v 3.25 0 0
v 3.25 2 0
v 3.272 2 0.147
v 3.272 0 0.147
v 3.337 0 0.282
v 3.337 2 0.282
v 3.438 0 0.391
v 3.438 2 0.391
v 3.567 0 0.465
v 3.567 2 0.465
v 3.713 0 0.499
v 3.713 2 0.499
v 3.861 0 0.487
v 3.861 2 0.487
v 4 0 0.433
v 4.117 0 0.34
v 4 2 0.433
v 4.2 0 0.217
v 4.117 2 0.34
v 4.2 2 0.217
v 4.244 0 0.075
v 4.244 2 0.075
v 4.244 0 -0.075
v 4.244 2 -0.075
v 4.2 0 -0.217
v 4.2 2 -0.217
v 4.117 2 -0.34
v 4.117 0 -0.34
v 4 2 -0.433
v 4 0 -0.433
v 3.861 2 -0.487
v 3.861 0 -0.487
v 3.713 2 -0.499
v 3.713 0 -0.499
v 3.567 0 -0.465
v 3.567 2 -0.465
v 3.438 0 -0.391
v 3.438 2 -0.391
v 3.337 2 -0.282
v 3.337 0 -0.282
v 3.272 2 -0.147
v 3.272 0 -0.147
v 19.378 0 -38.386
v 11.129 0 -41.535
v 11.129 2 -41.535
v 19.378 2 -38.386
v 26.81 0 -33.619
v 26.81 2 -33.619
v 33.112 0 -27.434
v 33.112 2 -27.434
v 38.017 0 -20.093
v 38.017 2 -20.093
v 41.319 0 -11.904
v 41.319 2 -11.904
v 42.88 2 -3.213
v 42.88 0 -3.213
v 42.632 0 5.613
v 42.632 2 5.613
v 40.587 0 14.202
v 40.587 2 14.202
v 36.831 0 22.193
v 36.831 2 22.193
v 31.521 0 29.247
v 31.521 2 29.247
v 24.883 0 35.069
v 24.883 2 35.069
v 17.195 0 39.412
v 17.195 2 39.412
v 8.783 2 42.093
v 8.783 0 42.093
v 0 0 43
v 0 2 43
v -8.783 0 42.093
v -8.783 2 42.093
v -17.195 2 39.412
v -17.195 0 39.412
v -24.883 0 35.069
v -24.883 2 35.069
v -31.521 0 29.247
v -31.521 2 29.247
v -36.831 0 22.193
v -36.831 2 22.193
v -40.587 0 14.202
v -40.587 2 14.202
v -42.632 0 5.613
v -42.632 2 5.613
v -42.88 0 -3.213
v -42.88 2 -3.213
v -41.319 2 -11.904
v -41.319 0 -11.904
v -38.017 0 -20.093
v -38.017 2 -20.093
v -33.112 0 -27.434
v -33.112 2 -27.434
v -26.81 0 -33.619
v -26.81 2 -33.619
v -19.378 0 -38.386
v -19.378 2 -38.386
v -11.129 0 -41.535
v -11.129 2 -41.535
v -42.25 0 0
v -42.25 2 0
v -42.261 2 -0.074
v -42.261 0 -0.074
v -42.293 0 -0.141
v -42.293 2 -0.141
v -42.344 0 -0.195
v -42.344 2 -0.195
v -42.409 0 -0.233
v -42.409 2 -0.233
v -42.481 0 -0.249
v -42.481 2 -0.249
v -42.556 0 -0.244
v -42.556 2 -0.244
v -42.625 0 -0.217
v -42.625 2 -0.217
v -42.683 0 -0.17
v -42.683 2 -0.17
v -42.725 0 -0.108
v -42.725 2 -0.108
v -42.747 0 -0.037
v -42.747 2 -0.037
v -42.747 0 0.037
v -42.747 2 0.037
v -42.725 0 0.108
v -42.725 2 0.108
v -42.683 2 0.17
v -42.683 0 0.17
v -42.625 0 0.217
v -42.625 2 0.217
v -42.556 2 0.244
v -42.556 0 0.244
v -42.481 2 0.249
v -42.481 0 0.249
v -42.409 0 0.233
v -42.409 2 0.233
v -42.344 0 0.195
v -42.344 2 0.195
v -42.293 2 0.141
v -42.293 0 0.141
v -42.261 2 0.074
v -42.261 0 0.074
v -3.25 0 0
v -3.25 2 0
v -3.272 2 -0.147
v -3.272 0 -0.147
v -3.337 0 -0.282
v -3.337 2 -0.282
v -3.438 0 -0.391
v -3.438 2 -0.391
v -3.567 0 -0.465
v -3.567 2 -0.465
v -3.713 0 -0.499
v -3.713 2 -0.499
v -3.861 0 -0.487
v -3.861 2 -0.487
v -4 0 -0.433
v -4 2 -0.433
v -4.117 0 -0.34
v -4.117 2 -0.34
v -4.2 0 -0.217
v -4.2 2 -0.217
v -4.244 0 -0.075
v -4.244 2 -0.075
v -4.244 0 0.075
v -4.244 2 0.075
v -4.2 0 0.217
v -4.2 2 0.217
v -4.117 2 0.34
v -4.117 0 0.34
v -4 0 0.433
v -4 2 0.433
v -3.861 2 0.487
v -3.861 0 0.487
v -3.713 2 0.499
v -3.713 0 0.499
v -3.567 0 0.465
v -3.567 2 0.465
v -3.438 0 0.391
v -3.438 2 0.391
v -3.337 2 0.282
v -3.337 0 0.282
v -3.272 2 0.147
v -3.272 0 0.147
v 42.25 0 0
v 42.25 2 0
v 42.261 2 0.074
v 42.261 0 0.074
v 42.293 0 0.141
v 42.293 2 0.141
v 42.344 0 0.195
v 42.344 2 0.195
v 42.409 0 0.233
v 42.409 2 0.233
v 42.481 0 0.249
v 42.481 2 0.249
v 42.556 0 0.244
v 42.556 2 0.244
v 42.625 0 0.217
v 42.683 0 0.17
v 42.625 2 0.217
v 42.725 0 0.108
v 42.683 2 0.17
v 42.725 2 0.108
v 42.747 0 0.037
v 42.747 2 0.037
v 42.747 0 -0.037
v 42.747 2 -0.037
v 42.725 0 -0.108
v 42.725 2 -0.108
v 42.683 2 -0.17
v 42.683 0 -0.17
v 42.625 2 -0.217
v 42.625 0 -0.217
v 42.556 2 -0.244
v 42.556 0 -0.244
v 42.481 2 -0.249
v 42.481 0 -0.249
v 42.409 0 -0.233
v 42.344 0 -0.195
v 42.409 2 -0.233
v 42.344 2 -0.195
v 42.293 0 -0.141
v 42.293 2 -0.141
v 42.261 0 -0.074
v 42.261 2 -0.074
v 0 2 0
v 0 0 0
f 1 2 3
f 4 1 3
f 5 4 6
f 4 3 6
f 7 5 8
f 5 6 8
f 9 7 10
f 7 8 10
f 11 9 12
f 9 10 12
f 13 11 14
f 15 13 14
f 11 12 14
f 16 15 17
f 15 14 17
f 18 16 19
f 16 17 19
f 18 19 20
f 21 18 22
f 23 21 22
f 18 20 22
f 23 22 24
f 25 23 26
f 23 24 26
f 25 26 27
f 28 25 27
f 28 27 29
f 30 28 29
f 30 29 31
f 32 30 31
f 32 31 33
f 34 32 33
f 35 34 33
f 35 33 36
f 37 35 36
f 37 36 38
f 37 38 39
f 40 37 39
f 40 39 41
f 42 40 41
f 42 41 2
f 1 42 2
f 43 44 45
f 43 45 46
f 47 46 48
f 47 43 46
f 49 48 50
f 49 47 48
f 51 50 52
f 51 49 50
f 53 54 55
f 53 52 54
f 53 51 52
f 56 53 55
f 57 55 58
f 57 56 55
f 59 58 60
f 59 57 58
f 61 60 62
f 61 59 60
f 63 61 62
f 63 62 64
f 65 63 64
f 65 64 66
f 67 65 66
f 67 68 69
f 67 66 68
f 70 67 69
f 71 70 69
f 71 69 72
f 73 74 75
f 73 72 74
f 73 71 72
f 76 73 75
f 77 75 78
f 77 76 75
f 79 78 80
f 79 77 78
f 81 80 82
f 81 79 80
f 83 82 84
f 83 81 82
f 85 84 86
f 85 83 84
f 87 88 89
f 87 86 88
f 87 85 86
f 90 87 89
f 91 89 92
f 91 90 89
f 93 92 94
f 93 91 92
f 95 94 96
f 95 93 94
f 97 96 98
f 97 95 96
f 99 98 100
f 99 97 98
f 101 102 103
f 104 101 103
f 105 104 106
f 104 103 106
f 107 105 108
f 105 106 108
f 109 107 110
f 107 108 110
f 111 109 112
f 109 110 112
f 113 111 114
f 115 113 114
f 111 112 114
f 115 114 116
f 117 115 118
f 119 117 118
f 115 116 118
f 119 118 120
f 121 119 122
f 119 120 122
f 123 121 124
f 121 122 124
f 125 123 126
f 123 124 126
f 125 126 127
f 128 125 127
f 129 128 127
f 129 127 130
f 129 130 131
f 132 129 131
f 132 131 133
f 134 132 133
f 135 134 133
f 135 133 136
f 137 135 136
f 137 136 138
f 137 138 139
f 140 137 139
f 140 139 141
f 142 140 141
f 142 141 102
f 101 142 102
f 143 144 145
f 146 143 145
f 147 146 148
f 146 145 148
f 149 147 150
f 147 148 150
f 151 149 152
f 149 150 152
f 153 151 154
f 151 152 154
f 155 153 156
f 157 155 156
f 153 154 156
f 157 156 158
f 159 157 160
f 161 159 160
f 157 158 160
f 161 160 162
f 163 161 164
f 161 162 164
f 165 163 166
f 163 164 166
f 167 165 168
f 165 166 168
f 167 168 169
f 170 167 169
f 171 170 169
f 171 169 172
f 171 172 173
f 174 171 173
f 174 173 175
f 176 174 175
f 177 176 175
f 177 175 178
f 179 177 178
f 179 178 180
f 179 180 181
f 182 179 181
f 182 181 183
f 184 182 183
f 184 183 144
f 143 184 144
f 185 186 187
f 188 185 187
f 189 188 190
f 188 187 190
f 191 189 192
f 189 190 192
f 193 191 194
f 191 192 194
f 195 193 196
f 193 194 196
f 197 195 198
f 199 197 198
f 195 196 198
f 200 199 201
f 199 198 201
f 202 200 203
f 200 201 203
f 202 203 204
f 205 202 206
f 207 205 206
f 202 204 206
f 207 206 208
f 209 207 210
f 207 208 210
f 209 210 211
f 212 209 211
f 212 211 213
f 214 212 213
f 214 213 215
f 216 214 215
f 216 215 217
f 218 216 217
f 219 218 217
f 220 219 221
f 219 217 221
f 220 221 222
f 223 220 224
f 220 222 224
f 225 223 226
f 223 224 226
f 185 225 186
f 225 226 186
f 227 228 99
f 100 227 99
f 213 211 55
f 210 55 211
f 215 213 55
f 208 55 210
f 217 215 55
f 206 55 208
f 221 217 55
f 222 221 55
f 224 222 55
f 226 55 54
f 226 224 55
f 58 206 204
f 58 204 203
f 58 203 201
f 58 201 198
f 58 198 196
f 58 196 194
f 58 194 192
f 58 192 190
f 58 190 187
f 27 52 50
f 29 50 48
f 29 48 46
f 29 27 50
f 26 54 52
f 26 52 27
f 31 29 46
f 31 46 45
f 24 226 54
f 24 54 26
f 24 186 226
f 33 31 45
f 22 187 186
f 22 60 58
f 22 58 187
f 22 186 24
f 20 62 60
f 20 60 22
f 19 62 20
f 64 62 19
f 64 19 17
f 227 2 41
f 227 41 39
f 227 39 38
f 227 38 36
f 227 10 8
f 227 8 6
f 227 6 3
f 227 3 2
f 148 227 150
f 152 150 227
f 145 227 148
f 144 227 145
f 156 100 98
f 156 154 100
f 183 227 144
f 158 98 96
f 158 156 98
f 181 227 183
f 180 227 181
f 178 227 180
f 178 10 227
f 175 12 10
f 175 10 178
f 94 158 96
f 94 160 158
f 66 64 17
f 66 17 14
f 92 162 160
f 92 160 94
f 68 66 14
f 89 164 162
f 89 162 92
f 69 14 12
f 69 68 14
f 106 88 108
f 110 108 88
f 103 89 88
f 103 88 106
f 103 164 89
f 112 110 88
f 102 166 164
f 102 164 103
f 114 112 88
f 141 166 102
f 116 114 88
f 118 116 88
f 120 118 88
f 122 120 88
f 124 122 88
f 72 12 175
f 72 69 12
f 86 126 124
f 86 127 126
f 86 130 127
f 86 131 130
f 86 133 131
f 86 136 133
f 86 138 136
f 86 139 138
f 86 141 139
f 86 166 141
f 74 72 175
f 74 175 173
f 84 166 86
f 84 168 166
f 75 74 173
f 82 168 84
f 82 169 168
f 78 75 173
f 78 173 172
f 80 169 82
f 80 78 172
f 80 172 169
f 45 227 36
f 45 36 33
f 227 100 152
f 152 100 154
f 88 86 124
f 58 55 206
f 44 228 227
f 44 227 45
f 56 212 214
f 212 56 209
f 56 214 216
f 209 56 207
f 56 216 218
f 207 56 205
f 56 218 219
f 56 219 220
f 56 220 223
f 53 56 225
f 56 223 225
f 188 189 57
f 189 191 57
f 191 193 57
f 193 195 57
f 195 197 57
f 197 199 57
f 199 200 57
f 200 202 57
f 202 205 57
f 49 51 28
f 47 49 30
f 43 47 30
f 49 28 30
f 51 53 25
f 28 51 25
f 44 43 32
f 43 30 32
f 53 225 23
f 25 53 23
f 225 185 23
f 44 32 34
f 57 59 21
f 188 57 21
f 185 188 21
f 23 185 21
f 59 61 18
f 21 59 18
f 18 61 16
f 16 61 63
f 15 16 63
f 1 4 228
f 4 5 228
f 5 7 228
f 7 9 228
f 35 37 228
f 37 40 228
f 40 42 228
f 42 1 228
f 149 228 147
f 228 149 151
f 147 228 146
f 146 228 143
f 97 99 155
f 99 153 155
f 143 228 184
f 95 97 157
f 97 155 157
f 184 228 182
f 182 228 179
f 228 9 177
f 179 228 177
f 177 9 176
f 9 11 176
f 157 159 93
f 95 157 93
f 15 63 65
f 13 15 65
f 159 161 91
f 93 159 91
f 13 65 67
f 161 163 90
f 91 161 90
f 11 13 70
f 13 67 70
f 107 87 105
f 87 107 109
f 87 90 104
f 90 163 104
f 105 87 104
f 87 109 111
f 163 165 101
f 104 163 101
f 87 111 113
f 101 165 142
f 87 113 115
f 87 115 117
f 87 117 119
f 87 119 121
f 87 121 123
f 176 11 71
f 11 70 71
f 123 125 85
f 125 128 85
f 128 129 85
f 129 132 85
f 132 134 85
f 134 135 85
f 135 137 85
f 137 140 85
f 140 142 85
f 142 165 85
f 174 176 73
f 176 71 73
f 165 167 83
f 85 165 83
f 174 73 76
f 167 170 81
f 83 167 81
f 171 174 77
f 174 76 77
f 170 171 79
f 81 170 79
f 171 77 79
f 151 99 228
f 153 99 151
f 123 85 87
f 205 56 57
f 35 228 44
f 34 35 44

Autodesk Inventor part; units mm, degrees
ref_plane "YZ Plane" through (0, 0, 0) normal (1, 0, 0) x (0, 1, 0)
ref_plane "XY Plane" through (0, 0, 0) normal (0, 0, 1) x (1, 0, 0)
sketch "Sketch1" plane through (0, 0, 0) normal (0, 1, 0) x (-1, 0, 0)
  arc A0 (11.1292, -41.5348) -> (-11.1292, -41.5348) centre (0, 0) ccw
  line L0 (0, 0) -> (11.1292, -41.5348)
  line L1 (0, 0) -> (43, 0) construction
  line L2 (0, 0) -> (-11.1292, -41.5348)
  dimension "d0" = 86
  dimension "d1" = 75
extrude "Extrusion1" add sketch "Sketch1" along normal blind 2
ref_plane "Work Plane1" through (0, 1, 0) normal (0, 1, 0) x (-1, 0, 0)
sketch "Sketch2" plane through (0, 2, 0) normal (0, 1, 0) x (1, 0, 0)
  circle A0 centre (-42.5, 0) radius 0.25
  arc A1 (-11.1292, 41.5348) -> (11.1292, 41.5348) centre (0, 0) ccw projected
  dimension "d4" = 0.5
  dimension "d5" = 42.5
extrude "Extrusion2" cut sketch "Sketch2" against normal through all
mirror "Mirror1" about plane through (0, 0, 0) normal (1, 0, 0) of "Extrusion2"
sketch "Sketch4" plane through (0, 2, 0) normal (0, 1, 0) x (1, 0, 0)
  circle A0 centre (-3.75, 0) radius 0.5
  point P0 (0, 0)
  dimension "d12" = 1
  dimension "d13" = 3.75
extrude "Extrusion4" cut sketch "Sketch4" against normal through all
mirror "Mirror3" about plane through (0, 0, 0) normal (1, 0, 0) of "Extrusion4"
properties part number "seed_disp_lid" material "PMMA Plastic"
